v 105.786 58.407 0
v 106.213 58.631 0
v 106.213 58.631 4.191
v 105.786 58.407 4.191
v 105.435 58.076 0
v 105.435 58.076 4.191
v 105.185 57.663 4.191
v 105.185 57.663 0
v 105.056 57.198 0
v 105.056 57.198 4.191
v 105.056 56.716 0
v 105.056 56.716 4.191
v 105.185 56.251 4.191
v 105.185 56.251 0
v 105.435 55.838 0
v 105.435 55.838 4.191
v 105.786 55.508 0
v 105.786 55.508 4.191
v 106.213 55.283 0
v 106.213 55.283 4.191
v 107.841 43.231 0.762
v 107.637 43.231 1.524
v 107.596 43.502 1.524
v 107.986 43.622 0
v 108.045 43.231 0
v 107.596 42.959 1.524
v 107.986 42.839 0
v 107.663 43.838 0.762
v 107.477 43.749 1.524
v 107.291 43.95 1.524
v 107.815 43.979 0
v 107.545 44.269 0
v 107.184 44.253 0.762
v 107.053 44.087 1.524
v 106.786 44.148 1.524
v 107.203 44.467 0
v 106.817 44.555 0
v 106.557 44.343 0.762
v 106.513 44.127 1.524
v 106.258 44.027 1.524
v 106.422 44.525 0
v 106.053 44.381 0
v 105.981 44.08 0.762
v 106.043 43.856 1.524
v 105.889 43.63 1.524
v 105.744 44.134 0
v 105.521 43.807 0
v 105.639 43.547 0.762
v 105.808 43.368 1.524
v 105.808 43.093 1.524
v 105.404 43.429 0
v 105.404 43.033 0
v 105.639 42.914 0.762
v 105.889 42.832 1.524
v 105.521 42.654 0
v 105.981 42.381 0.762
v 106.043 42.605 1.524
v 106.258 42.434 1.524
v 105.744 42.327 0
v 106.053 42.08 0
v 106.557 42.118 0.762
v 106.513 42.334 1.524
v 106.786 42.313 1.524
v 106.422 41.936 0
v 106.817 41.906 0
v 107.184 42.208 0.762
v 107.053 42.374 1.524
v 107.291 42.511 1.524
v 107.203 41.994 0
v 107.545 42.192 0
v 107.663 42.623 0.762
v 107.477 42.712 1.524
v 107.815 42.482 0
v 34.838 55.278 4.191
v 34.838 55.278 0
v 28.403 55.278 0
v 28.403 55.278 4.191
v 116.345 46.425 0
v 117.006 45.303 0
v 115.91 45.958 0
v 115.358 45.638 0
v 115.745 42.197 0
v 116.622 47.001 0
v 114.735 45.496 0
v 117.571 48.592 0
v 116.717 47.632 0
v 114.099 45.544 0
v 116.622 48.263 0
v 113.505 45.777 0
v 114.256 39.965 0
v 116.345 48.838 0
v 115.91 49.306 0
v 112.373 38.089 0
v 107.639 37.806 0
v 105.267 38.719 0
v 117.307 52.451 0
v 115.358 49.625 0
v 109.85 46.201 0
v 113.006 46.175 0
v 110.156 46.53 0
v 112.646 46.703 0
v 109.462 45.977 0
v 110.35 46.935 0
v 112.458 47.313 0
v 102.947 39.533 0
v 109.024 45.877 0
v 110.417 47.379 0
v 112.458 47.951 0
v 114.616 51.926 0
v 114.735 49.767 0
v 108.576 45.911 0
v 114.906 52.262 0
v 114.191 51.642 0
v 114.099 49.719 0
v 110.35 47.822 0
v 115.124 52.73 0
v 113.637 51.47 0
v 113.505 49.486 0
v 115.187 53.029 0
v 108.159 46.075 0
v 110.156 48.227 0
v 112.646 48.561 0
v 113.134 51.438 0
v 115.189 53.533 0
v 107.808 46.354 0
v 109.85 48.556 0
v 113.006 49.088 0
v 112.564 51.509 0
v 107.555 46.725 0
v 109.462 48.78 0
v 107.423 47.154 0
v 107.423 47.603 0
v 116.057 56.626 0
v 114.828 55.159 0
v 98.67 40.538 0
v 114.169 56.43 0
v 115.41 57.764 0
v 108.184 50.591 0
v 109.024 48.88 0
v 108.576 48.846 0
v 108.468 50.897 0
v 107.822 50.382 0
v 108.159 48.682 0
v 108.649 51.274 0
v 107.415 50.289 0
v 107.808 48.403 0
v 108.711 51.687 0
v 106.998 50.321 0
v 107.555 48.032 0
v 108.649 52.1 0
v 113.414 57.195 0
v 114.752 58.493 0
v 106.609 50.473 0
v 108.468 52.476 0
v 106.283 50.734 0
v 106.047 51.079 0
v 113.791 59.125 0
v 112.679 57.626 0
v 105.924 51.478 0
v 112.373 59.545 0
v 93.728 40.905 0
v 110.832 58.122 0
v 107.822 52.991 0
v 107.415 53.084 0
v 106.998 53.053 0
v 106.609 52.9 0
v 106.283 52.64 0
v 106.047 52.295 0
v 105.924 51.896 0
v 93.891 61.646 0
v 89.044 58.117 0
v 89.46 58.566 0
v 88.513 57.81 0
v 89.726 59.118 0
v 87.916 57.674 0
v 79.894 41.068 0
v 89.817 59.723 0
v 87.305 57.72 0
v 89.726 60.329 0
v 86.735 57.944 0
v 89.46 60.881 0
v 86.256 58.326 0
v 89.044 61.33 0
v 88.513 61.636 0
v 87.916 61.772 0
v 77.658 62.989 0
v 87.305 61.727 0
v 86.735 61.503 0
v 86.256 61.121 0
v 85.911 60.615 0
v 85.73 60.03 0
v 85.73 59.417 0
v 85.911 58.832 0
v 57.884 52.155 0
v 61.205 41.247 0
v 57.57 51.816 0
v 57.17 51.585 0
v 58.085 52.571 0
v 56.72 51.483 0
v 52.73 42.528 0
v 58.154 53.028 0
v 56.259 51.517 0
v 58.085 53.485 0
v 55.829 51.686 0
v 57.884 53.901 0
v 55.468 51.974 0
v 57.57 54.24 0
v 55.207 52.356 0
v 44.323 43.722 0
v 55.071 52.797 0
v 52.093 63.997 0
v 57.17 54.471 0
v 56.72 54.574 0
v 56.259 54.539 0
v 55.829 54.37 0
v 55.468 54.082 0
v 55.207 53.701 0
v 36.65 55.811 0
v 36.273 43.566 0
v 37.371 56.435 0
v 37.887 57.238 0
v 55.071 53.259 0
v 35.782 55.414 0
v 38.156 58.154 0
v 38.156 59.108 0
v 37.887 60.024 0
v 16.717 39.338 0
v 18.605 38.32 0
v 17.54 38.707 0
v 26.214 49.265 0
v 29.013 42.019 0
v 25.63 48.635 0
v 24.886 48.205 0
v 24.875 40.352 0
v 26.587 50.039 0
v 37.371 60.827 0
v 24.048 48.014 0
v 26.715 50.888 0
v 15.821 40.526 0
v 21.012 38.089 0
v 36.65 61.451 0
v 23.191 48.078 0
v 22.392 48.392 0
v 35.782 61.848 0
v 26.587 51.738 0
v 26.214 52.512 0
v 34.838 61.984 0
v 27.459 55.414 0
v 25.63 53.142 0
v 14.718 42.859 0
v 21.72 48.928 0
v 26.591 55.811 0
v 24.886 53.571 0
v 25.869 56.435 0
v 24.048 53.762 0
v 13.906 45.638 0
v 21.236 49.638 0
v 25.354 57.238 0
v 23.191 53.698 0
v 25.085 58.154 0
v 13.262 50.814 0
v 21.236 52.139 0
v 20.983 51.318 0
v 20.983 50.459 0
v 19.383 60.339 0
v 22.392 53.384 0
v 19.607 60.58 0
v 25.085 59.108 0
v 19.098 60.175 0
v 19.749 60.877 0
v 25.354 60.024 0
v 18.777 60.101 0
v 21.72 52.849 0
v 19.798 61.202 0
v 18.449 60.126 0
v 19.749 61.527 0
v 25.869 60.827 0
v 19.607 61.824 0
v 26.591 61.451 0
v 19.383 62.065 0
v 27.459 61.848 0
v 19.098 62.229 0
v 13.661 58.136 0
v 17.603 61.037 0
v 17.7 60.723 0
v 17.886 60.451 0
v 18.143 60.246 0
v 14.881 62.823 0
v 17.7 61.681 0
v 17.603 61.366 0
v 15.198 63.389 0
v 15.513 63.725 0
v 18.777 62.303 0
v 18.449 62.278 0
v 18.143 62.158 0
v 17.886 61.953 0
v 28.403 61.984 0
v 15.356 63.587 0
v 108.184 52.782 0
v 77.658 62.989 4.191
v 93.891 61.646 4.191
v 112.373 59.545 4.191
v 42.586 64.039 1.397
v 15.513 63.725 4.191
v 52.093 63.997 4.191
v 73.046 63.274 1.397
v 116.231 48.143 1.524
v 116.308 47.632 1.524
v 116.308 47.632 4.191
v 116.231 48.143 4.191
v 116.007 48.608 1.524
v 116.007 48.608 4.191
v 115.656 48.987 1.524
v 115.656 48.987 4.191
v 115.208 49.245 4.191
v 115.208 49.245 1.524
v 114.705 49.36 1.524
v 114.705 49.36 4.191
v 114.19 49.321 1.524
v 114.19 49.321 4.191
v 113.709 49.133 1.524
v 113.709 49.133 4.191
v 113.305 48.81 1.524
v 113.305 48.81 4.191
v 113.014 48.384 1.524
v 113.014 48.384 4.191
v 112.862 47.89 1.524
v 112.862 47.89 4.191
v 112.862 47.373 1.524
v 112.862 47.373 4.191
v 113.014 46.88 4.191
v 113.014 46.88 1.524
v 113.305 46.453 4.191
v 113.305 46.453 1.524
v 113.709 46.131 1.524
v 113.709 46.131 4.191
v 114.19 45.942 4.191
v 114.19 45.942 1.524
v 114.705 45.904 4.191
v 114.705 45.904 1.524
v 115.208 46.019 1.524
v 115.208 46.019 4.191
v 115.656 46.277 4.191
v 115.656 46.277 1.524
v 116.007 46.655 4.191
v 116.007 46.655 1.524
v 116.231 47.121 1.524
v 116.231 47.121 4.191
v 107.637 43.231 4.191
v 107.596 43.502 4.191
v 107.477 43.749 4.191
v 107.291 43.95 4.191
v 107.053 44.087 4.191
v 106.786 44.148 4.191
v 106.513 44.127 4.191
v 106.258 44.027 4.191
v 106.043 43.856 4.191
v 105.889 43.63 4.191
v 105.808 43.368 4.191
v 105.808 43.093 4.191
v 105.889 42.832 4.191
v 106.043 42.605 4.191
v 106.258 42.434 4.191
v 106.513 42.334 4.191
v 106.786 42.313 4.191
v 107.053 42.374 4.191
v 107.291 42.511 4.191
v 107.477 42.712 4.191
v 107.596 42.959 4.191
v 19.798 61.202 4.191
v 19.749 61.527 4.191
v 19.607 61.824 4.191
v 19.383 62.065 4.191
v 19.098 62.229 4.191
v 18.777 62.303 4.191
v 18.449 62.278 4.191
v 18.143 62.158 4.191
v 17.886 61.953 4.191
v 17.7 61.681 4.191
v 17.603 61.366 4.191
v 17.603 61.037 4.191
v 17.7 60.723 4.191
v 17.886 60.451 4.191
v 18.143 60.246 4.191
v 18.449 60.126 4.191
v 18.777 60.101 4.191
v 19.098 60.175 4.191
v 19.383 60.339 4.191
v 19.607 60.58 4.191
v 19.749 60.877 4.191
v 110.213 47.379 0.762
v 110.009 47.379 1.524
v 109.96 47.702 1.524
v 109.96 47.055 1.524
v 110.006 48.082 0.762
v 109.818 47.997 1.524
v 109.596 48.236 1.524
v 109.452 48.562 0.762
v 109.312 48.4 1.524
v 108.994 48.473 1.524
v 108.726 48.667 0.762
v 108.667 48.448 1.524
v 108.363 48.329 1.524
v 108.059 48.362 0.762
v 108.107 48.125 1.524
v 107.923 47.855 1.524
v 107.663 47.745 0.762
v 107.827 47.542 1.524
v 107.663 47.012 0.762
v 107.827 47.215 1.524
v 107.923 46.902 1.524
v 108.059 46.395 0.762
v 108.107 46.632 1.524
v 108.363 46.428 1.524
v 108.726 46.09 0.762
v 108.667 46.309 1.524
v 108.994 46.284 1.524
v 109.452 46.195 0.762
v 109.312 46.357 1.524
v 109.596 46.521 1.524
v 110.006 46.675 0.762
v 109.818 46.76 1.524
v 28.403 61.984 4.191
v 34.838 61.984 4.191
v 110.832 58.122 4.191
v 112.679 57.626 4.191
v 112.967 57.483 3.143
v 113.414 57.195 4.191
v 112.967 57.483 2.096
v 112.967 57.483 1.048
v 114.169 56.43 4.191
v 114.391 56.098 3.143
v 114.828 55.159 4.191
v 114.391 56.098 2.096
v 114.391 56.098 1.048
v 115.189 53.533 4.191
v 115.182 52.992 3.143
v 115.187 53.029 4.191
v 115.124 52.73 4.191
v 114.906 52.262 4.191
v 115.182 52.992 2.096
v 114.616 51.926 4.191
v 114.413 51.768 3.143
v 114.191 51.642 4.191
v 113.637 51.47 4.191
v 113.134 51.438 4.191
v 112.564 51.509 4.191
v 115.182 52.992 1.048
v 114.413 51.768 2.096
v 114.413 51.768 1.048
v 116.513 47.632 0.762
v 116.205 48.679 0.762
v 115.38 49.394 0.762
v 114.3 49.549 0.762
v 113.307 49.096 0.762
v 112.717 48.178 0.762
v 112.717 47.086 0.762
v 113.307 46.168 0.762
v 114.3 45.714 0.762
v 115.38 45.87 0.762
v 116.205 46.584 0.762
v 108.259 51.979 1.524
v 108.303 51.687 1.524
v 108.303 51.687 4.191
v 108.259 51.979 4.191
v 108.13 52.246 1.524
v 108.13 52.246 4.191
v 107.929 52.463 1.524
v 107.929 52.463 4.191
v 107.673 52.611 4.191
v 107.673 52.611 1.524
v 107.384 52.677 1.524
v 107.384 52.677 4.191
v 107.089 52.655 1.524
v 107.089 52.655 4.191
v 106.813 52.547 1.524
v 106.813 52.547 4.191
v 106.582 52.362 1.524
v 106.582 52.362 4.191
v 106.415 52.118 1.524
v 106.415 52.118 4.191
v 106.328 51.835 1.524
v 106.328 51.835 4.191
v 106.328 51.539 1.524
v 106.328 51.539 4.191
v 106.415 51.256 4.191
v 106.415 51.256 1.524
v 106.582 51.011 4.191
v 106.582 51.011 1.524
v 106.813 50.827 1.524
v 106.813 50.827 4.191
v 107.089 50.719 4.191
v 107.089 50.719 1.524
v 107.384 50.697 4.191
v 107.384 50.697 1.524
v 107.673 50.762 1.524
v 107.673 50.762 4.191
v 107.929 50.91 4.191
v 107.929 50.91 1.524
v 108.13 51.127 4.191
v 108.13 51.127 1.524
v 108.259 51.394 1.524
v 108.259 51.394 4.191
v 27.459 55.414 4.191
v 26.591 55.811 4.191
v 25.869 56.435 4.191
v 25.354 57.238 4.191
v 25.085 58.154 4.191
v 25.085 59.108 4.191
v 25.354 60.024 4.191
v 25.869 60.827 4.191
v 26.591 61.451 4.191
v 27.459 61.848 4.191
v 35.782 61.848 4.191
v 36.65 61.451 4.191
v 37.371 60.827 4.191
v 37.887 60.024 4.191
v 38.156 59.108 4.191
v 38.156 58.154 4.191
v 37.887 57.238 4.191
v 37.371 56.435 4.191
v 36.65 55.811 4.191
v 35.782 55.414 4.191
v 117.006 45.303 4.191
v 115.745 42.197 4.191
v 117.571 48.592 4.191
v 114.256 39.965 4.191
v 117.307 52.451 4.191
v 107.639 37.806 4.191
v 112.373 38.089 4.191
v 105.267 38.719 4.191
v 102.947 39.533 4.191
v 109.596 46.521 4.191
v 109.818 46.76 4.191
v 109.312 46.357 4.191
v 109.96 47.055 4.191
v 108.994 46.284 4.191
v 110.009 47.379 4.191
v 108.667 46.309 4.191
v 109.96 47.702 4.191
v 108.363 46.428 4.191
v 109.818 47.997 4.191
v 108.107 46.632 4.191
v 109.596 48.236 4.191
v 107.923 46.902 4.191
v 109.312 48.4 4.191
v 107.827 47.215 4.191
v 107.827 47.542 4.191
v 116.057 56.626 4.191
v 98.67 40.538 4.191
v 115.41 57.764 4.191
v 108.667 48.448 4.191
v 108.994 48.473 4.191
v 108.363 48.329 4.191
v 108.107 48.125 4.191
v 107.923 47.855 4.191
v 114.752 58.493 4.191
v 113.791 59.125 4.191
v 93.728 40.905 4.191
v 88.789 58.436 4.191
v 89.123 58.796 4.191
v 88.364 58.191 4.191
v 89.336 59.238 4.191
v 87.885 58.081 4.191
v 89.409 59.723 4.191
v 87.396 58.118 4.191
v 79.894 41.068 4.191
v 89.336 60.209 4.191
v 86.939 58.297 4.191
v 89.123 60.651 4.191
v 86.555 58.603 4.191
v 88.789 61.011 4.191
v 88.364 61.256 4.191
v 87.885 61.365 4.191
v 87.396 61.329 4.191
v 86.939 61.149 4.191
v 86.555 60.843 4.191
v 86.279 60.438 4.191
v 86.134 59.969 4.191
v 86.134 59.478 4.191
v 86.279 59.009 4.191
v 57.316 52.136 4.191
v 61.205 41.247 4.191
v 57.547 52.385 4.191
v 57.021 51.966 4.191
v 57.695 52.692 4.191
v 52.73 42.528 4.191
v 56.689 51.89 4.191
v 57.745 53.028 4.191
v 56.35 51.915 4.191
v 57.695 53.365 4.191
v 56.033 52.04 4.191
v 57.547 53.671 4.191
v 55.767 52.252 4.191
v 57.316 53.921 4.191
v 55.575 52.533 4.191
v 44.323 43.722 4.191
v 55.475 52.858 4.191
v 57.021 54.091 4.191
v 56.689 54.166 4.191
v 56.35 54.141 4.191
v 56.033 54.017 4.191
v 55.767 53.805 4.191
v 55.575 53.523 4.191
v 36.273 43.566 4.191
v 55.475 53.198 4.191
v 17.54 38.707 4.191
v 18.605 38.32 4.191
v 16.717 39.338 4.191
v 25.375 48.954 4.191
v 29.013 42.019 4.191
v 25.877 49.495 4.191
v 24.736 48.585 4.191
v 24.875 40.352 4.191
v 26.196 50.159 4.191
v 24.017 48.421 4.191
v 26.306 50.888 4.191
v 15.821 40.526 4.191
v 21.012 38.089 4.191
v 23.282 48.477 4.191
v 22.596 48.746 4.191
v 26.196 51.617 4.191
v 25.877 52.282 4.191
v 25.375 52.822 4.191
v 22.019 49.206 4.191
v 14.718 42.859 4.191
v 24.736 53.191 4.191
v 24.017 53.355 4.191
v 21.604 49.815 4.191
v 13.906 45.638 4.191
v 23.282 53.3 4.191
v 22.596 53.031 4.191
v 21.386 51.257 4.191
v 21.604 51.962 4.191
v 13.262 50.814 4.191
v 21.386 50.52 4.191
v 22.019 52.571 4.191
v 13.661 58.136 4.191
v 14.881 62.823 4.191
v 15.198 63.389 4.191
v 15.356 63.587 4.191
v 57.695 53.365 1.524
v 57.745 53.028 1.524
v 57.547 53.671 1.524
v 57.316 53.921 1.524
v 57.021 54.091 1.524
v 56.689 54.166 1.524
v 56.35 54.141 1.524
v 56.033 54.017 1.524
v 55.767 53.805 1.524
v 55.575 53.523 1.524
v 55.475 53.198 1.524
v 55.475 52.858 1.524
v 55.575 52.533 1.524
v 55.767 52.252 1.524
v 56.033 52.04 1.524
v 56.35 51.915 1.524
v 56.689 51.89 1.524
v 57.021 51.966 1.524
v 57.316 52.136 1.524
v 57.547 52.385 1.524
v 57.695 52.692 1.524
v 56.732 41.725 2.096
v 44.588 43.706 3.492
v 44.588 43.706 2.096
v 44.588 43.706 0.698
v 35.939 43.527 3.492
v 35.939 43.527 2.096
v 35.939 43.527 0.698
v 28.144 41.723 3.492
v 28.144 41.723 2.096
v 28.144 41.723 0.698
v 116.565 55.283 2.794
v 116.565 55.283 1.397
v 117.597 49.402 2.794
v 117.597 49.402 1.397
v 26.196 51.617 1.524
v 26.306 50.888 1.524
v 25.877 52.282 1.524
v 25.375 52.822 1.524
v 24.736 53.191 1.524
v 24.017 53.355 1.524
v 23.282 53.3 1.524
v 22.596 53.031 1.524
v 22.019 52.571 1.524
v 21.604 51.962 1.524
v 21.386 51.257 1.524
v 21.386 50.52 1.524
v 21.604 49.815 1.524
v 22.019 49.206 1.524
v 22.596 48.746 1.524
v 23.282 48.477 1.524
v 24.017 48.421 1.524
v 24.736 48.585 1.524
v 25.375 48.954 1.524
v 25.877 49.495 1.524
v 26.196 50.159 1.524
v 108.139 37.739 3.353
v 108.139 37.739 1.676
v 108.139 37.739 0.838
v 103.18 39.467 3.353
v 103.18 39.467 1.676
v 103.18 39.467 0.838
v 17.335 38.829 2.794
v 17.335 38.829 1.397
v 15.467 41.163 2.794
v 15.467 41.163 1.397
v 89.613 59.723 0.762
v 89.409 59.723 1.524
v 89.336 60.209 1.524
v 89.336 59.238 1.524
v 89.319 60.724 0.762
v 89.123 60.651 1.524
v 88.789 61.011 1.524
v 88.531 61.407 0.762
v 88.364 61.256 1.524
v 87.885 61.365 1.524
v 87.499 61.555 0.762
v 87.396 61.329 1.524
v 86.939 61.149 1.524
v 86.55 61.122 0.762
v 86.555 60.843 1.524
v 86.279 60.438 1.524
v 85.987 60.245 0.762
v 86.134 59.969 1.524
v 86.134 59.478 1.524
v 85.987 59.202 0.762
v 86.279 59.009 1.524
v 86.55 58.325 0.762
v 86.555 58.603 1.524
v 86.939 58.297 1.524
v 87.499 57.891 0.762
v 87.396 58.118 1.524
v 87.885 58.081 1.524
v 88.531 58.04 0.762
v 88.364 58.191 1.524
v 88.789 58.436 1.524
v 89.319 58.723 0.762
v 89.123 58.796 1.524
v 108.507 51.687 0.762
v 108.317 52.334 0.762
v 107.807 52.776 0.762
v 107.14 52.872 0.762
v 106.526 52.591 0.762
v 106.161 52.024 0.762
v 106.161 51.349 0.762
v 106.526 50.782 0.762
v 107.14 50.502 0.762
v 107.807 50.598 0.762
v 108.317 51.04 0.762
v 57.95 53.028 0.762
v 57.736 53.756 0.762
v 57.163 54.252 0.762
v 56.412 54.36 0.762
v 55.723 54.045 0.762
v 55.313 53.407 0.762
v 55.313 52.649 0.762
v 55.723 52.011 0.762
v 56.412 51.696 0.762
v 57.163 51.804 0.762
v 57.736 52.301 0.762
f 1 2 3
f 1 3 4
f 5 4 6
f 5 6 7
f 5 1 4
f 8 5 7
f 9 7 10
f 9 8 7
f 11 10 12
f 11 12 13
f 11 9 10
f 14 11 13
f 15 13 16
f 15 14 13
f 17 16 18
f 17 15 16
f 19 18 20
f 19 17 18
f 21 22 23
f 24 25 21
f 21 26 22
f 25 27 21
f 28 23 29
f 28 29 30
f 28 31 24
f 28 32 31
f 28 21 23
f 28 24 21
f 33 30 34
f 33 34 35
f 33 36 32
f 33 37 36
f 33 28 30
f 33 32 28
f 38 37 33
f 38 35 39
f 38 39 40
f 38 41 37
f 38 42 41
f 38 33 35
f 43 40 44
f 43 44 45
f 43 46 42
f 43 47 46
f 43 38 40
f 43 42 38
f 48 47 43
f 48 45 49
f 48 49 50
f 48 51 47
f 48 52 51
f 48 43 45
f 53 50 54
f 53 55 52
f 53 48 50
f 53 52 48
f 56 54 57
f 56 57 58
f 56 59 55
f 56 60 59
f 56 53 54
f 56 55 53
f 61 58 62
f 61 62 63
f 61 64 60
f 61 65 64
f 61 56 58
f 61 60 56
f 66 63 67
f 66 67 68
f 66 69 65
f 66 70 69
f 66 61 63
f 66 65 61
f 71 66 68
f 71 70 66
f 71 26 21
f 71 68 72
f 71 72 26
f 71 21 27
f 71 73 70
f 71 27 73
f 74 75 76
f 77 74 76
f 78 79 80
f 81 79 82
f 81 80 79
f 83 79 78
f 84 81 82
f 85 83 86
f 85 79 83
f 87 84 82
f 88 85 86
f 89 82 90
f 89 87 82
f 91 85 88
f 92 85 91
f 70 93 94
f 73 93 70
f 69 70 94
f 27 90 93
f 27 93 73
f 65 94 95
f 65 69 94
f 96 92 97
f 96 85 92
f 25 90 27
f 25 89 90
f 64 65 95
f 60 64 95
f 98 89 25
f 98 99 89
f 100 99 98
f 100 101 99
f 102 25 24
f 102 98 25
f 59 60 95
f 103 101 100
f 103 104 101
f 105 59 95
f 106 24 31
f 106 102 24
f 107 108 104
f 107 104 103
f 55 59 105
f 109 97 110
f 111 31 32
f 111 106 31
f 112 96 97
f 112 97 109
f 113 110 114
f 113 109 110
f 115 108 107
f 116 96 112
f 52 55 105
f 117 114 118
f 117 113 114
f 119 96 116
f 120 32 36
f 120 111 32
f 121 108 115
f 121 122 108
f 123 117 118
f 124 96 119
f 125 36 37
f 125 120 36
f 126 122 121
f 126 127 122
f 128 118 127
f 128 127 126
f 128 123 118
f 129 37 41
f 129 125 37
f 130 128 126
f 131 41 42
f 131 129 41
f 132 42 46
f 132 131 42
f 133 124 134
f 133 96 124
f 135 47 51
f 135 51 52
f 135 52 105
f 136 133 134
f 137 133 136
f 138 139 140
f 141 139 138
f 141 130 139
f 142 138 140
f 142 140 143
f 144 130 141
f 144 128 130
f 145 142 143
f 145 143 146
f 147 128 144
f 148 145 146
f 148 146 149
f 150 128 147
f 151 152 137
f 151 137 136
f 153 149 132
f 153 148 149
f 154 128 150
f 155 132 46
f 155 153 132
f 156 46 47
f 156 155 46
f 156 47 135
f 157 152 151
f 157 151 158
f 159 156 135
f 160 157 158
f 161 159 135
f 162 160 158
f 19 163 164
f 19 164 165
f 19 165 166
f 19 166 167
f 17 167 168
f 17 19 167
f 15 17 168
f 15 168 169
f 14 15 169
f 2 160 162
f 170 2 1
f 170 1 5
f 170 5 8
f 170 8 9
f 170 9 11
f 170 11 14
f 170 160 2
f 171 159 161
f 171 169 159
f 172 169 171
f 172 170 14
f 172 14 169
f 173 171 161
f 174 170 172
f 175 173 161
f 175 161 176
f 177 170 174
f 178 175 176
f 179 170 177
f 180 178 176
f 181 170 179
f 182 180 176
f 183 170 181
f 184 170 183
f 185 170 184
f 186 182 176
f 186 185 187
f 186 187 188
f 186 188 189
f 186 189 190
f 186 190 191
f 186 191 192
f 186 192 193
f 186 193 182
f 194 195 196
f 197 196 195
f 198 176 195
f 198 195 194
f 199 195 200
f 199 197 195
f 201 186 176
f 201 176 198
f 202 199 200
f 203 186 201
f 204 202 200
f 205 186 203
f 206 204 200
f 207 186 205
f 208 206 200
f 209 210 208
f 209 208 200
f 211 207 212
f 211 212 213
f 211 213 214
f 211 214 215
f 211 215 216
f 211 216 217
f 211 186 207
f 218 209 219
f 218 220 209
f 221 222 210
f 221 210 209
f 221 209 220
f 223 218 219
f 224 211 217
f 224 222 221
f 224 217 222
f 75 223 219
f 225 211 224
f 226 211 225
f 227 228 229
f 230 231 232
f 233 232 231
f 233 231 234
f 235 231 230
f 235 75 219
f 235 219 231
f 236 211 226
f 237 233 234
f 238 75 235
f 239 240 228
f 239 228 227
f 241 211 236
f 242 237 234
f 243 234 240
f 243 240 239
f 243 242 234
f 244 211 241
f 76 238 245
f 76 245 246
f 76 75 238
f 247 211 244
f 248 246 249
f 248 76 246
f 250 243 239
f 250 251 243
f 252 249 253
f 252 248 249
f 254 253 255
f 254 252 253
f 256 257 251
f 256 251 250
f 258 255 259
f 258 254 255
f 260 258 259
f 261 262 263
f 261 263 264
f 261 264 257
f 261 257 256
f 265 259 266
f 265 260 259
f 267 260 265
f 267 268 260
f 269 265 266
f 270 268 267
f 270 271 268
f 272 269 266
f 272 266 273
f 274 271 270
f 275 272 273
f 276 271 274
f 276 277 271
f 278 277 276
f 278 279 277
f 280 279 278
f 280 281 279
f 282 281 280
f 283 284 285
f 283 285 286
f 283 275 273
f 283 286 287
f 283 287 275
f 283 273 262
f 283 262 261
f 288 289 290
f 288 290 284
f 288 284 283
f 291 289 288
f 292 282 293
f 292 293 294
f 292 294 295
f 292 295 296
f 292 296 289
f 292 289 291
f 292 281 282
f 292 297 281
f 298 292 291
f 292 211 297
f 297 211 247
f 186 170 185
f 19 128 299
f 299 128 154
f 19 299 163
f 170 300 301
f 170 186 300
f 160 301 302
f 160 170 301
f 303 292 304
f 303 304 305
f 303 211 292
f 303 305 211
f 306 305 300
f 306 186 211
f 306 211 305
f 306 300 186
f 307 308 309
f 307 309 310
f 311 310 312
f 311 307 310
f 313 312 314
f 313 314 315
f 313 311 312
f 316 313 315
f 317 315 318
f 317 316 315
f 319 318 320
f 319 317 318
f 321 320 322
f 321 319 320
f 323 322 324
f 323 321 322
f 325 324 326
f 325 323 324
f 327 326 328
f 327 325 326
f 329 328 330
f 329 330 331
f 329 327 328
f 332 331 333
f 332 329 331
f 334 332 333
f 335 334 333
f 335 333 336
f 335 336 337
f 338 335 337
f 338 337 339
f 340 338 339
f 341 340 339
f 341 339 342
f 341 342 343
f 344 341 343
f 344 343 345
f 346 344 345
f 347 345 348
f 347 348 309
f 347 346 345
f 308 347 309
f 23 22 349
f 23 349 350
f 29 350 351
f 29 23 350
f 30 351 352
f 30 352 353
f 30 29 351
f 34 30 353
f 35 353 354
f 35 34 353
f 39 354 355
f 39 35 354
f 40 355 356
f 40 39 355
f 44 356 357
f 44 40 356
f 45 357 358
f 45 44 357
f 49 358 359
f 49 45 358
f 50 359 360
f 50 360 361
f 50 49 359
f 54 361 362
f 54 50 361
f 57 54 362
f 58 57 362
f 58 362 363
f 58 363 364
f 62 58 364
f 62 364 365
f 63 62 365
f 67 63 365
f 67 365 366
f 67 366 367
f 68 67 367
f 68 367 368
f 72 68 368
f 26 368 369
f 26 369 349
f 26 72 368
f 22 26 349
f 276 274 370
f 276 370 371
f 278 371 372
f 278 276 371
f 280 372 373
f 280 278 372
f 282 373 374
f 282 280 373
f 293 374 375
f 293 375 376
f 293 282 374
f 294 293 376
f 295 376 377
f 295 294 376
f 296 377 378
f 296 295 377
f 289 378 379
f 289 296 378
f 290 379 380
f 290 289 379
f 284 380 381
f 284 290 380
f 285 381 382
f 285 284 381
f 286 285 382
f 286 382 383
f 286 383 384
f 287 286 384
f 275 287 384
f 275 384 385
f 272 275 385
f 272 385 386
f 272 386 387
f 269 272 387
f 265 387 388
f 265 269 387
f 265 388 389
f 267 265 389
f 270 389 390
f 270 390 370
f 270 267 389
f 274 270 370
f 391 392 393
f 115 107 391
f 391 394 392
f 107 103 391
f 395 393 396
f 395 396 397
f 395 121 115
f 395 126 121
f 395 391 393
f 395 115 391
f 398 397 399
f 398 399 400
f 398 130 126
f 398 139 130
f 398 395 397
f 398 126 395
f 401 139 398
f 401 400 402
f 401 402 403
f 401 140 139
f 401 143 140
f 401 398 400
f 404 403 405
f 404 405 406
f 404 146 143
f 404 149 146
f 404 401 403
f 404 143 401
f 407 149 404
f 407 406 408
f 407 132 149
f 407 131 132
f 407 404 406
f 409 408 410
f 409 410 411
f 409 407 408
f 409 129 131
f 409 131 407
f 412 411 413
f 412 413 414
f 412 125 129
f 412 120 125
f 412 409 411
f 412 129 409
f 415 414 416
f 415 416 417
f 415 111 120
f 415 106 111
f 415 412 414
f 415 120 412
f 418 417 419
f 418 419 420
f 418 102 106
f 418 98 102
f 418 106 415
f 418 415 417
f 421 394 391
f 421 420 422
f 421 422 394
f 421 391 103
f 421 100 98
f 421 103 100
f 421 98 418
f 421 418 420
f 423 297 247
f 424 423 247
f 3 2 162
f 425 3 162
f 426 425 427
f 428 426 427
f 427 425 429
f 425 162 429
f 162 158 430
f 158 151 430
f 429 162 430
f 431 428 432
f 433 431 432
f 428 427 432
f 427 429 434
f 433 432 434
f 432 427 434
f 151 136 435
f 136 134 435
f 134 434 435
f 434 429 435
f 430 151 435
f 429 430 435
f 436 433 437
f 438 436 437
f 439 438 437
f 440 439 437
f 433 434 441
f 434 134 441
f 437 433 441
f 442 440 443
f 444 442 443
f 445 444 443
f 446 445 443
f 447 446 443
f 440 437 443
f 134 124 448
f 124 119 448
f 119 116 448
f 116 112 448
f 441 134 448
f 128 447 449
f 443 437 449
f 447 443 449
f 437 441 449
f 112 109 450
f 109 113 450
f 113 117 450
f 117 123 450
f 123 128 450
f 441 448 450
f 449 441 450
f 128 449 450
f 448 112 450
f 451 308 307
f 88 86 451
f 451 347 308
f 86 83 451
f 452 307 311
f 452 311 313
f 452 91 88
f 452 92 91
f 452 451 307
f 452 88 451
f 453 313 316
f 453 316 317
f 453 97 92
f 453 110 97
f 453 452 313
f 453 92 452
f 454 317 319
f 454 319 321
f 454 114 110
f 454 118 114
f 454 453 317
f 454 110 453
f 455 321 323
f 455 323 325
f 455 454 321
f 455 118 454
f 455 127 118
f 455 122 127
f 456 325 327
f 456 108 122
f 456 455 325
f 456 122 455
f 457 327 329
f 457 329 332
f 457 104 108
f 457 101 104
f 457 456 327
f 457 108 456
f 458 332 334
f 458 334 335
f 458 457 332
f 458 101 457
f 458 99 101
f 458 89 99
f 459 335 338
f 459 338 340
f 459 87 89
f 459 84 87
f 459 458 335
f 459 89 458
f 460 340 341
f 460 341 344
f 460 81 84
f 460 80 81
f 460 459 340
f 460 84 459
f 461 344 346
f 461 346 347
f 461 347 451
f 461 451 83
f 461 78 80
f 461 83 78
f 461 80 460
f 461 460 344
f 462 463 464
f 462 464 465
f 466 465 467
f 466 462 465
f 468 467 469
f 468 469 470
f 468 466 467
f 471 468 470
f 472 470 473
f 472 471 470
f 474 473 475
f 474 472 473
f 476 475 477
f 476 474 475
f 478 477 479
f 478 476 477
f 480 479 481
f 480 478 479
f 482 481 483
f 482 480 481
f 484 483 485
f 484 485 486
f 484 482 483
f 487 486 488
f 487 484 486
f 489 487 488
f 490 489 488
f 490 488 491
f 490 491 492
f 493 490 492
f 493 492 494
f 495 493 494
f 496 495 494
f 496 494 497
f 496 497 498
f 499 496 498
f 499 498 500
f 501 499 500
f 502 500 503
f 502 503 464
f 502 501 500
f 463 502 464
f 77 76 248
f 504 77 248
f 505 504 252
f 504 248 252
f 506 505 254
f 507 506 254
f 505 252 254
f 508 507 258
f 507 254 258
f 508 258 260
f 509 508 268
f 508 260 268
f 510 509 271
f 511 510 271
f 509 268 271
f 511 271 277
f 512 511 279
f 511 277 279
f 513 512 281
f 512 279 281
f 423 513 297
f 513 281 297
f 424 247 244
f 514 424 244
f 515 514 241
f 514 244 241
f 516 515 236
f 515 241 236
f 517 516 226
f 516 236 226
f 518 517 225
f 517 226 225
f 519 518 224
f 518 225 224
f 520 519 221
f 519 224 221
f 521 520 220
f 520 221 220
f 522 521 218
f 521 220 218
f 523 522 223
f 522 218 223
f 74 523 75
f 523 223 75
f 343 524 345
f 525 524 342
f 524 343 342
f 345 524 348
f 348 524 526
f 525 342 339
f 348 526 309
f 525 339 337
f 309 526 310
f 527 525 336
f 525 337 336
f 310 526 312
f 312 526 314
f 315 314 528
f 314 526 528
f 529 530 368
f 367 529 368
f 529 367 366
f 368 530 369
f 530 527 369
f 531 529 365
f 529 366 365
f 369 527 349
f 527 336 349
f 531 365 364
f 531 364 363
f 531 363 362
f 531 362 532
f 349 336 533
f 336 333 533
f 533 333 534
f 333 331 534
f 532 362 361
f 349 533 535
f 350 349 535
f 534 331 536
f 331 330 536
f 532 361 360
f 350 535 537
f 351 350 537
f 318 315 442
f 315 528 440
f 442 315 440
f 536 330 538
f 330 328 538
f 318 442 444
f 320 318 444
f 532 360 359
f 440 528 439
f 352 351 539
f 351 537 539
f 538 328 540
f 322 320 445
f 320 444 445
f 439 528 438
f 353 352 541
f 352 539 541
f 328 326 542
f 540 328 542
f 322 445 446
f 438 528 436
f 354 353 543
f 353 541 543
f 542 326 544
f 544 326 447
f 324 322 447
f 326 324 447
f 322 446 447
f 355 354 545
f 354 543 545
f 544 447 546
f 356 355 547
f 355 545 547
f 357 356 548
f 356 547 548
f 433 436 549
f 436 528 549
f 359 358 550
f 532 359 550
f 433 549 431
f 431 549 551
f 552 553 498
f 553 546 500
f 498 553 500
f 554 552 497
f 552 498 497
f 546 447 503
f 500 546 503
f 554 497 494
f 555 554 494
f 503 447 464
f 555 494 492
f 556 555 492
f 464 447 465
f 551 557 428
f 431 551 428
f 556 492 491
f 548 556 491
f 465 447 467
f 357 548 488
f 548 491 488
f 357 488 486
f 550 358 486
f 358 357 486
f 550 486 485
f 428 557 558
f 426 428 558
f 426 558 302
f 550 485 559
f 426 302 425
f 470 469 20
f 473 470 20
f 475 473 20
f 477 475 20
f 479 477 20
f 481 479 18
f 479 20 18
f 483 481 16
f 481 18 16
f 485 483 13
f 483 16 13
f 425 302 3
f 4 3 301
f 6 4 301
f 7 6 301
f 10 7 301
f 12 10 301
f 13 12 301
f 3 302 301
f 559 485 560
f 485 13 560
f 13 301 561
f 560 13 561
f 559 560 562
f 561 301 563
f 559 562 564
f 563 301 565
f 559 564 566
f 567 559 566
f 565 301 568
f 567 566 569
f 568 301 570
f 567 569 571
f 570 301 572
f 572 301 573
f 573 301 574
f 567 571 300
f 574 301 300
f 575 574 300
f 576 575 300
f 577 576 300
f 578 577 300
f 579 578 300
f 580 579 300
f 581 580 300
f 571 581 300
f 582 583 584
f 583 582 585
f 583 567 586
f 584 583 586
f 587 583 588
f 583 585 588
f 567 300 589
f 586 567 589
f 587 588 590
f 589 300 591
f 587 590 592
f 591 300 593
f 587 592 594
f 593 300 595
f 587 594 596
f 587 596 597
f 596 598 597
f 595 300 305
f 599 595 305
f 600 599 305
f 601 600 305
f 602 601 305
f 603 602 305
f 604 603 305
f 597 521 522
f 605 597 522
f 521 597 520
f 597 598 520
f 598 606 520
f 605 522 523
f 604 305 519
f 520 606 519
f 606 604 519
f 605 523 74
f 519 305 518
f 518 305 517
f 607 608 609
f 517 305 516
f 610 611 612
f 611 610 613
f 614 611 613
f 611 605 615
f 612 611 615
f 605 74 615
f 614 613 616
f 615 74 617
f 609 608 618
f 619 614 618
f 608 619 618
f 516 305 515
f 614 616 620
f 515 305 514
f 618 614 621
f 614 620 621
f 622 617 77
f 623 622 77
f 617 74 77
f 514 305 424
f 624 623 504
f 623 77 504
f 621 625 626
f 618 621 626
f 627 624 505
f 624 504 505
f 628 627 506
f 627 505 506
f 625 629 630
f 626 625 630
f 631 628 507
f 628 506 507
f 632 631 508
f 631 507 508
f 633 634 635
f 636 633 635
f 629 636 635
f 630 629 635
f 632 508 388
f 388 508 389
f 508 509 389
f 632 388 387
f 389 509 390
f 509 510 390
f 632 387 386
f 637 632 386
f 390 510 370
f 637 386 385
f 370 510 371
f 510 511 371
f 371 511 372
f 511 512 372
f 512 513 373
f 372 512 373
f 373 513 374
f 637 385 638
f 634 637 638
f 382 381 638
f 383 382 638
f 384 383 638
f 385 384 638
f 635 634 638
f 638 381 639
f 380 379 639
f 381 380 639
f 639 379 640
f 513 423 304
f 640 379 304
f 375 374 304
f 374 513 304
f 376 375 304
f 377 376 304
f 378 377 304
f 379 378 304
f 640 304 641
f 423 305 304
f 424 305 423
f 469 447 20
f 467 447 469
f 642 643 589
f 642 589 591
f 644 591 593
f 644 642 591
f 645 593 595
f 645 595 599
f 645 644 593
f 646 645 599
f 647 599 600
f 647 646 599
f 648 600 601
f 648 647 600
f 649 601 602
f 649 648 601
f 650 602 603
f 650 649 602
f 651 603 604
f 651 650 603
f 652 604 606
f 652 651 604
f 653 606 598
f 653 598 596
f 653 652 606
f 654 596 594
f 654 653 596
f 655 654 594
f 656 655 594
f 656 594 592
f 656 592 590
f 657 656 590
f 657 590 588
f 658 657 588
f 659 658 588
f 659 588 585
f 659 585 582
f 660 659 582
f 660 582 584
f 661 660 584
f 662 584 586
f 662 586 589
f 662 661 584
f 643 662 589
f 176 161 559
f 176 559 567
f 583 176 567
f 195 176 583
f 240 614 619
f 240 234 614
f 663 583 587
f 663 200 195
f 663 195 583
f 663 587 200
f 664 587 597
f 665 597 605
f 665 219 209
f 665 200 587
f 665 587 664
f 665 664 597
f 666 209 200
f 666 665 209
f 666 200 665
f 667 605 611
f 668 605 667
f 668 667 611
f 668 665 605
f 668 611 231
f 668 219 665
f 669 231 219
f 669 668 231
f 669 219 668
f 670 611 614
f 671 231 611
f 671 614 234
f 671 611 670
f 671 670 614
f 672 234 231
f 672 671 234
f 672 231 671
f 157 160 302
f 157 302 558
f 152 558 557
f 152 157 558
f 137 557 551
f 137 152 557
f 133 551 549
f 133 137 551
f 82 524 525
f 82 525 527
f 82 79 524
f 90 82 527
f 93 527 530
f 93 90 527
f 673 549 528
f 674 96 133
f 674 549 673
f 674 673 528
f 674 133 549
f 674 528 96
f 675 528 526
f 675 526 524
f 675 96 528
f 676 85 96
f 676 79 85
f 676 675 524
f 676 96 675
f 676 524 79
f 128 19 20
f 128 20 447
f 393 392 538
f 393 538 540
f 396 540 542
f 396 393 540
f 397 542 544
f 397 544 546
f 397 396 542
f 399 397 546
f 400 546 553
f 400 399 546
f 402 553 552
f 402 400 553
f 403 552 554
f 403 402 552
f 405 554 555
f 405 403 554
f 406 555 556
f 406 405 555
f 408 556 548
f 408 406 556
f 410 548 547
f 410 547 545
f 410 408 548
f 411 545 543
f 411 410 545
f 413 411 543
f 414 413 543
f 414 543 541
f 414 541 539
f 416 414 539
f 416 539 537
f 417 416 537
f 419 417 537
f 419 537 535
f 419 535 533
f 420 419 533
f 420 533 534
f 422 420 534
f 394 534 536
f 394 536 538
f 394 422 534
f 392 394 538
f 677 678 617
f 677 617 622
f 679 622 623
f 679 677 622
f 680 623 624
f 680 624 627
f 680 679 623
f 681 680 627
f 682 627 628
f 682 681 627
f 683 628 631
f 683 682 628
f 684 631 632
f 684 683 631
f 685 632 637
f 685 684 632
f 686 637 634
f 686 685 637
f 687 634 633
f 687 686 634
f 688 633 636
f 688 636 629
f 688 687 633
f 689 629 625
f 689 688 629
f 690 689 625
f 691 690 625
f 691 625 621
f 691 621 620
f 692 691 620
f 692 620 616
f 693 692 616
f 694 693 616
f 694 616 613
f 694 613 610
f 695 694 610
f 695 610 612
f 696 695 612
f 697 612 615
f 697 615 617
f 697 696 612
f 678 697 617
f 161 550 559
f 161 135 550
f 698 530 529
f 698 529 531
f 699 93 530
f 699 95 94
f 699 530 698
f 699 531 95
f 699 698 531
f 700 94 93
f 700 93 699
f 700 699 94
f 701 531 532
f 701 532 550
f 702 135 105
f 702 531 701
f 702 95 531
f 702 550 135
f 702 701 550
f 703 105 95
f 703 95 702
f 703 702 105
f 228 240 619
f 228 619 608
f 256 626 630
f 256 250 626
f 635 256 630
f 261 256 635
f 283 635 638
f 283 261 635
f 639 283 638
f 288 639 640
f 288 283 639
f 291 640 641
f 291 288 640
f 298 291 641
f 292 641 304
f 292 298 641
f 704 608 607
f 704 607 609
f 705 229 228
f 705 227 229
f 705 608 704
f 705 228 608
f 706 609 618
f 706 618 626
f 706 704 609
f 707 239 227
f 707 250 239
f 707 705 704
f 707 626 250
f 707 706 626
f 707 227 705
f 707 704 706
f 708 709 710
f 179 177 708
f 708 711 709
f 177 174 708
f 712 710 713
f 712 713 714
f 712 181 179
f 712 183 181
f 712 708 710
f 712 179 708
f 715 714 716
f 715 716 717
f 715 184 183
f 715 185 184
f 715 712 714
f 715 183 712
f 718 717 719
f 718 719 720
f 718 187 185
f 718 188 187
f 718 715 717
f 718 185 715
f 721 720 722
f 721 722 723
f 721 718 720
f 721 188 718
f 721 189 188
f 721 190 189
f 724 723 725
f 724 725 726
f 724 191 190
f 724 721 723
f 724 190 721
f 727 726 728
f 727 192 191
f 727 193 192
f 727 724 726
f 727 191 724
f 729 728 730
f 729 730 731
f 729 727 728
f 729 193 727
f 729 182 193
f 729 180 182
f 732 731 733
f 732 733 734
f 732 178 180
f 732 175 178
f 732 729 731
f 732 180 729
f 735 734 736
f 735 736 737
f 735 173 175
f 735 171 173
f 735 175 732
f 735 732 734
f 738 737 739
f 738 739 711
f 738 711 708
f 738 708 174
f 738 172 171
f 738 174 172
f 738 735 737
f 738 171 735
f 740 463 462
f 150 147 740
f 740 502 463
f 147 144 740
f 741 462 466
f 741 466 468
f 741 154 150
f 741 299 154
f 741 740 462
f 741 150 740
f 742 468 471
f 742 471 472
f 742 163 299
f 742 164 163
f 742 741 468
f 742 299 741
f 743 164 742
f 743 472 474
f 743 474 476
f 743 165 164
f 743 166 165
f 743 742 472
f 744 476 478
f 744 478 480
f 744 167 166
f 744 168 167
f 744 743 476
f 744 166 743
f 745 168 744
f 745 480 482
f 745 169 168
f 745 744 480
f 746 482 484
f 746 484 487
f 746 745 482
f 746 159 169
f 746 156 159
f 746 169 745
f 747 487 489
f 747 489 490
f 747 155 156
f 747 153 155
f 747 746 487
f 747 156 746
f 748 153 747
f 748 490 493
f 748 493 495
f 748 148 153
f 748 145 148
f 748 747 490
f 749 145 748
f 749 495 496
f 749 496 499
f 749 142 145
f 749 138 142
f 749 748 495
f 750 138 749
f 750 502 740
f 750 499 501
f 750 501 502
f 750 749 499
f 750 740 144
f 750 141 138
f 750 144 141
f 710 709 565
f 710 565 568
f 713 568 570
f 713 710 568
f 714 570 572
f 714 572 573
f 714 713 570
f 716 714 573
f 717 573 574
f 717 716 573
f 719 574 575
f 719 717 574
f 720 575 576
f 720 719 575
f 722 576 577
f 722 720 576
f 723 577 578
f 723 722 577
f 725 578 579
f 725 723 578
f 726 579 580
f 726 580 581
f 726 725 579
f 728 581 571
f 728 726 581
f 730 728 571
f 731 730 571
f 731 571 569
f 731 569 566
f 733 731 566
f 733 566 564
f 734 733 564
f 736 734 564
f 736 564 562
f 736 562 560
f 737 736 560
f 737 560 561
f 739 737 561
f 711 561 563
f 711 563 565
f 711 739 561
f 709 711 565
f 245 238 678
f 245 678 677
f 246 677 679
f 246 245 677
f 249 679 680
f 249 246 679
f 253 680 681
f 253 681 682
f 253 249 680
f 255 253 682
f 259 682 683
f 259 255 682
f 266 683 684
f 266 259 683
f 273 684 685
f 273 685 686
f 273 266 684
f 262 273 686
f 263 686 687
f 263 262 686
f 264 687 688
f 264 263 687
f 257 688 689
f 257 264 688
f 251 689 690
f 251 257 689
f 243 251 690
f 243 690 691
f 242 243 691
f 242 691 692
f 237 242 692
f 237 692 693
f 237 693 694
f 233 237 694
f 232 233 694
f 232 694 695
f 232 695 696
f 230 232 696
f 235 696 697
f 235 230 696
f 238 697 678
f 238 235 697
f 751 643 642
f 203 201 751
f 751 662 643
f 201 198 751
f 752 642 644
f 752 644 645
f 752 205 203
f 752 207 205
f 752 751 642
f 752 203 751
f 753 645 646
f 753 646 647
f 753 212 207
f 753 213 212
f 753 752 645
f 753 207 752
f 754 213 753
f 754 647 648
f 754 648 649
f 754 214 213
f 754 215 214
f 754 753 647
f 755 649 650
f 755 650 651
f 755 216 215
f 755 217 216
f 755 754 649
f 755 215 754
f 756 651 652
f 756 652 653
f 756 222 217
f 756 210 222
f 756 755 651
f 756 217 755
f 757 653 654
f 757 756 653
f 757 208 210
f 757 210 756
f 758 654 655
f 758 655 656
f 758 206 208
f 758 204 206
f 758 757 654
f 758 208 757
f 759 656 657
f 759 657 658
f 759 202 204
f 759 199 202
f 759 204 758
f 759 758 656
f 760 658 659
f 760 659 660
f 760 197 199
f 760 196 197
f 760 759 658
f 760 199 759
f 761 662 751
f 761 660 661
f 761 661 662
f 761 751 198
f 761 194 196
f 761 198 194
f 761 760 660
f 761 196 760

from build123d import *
from OCP.BRepFilletAPI import BRepFilletAPI_MakeChamfer

# Parameters (mm, degrees)
SKETCH1_R           = 1.10368272
SKETCH1_R_2         = 2.473771615
SKETCH1_R_3         = 1.141530029
SKETCH1_R_4         = 1.646532991
SKETCH1_R_5         = 0.992957035
SKETCH1_R_6         = 1.097250686
SKETCH1_R_7         = 0.919737921
SKETCH1_R_8         = 1.733023824
BOSS_EXTRUDE1_DEPTH = 4.191
CHAMFER1_SIZE       = 1.524
CHAMFER1_SIZE2      = 0.408354569


with BuildPart() as part:
    # Sketch1 → Boss-Extrude1 (new body)
    with BuildSketch(Plane.XY):
        with BuildLine():
            add(Edge.make_bspline(
                [(15.512876253, 63.725280297), (42.719401206, 63.948789993), (66.786450327, 65.385157199), (112.372925873, 59.54513019)],
                knots=[0, 0, 0, 0, 1, 1, 1, 1], degree=3))
            add(Edge.make_bspline(
                [(112.372925873, 59.54513019), (115.06163518, 59.135245646), (116.794510744, 55.30628864), (118.469687047, 47.231155573), (115.676928934, 40.73972784), (112.372925873, 38.089347261)],
                knots=[0, 0, 0, 0, 0.242320807, 0.484361008, 1, 1, 1, 1], degree=3))
            add(Edge.make_bspline(
                [(112.372925873, 38.089347261), (110.885555874, 37.883707638), (108.600235295, 37.607741566), (106.511043014, 38.028810817), (105.081904878, 38.917056614), (100.621256306, 40.212100692), (97.582606658, 40.947501698), (93.728353676, 40.905124022)],
                knots=[0, 0, 0, 0, 0.125673067, 0.162909154, 0.349088462, 0.435124788, 1, 1, 1, 1], degree=3))
            add(Edge.make_bspline(
                [(93.728353676, 40.905124022), (83.438696491, 41.478986396), (70.837114823, 40.450114199), (56.41922121, 41.6044677), (50.671354177, 43.09350077), (43.718819381, 43.91198411), (33.442775683, 43.82543302), (25.433984632, 41.165000317), (21.011717493, 38.089347261)],
                knots=[0, 0, 0, 0, 0.42688035, 0.50037363, 0.585645125, 0.666780076, 0.783694685, 1, 1, 1, 1], degree=3))
            add(Edge.make_bspline(
                [(21.011717493, 38.089347261), (19.810582443, 38.150303915), (17.367560982, 38.137908515), (11.153943442, 47.277156737), (13.736966959, 62.504701038), (15.512876253, 63.725280297)],
                knots=[0, 0, 0, 0, 0.130512904, 0.225933871, 1, 1, 1, 1], degree=3))
        make_face()
        with Locations((18.694741626, 61.201988498)):
            Circle(SKETCH1_R, mode=Mode.SUBTRACT)
        with Locations((23.83257498, 50.888263766)):
            Circle(SKETCH1_R_2, mode=Mode.SUBTRACT)
        with Locations((56.603802785, 53.028132556)):
            Circle(SKETCH1_R_3, mode=Mode.SUBTRACT)
        with Locations((87.762338524, 59.723272367)):
            Circle(SKETCH1_R_4, mode=Mode.SUBTRACT)
        with Locations((107.309974975, 51.686722441)):
            Circle(SKETCH1_R_5, mode=Mode.SUBTRACT)
        with Locations((108.911518579, 47.378570146)):
            Circle(SKETCH1_R_6, mode=Mode.SUBTRACT)
        with Locations((106.717403841, 43.23057221)):
            Circle(SKETCH1_R_7, mode=Mode.SUBTRACT)
        with Locations((114.575325698, 47.631735726)):
            Circle(SKETCH1_R_8, mode=Mode.SUBTRACT)
        with BuildLine():
            Line((28.403240505, 61.983635523), (34.837697919, 61.983635523))
            ThreePointArc((34.837697919, 61.983635523), (38.190335559, 58.630997882), (34.837697919, 55.278360242))
            Line((34.837697919, 55.278360242), (28.403240505, 55.278360242))
            ThreePointArc((28.403240505, 55.278360242), (25.050602865, 58.630997882), (28.403240505, 61.983635523))
        make_face(mode=Mode.SUBTRACT)
        with BuildLine():
            Line((106.21301999, 55.283465905), (112.563548609, 51.509323308))
            add(Edge.make_bspline(
                [(106.21301999, 58.630997882), (109.208741336, 58.225755094), (113.240394983, 58.369560335), (114.982397754, 55.424174213), (115.335874029, 52.312472158), (114.137714748, 51.176326624), (112.563548609, 51.509323308)],
                knots=[0, 0, 0, 0, 0.426431776, 0.761667371, 0.819024193, 1, 1, 1, 1], degree=3))
            ThreePointArc((106.21301999, 58.630997882), (105.039294672, 56.957231894), (106.21301999, 55.283465905))
        make_face(mode=Mode.SUBTRACT)
    extrude(amount=BOSS_EXTRUDE1_DEPTH)

    # Chamfer1: one chamfer whose edges measure the first distance from different faces: ONE call of the kernel's chamfer builder (chamfer() names one face for all edges)
    chamfer1_edges_1 = [part.edges().sort_by_distance(p)[0] for p in [
        (21.358803365, 50.888263766, 0),
    ]]
    chamfer1_side_1 = [part.faces().sort_by_distance(p)[0] for p in [
        (21.358803365, 50.888263766, 2.0955),
    ]]
    chamfer1_edges_2 = [part.edges().sort_by_distance(p)[0] for p in [
        (55.462272756, 53.028132556, 0),
    ]]
    chamfer1_side_2 = [part.faces().sort_by_distance(p)[0] for p in [
        (55.462272756, 53.028132556, 2.0955),
    ]]
    chamfer1_edges_3 = [part.edges().sort_by_distance(p)[0] for p in [
        (86.115805532, 59.723272367, 0),
    ]]
    chamfer1_side_3 = [part.faces().sort_by_distance(p)[0] for p in [
        (86.115805532, 59.723272367, 2.0955),
    ]]
    chamfer1_edges_4 = [part.edges().sort_by_distance(p)[0] for p in [
        (106.31701794, 51.686722441, 0),
    ]]
    chamfer1_side_4 = [part.faces().sort_by_distance(p)[0] for p in [
        (106.31701794, 51.686722441, 2.0955),
    ]]
    chamfer1_edges_5 = [part.edges().sort_by_distance(p)[0] for p in [
        (107.814267893, 47.378570146, 0),
    ]]
    chamfer1_side_5 = [part.faces().sort_by_distance(p)[0] for p in [
        (107.814267893, 47.378570146, 2.0955),
    ]]
    chamfer1_edges_6 = [part.edges().sort_by_distance(p)[0] for p in [
        (105.79766592, 43.23057221, 0),
    ]]
    chamfer1_side_6 = [part.faces().sort_by_distance(p)[0] for p in [
        (105.79766592, 43.23057221, 2.0955),
    ]]
    chamfer1_edges_7 = [part.edges().sort_by_distance(p)[0] for p in [
        (112.842301875, 47.631735726, 0),
    ]]
    chamfer1_side_7 = [part.faces().sort_by_distance(p)[0] for p in [
        (112.842301875, 47.631735726, 2.0955),
    ]]
    chamfer1 = BRepFilletAPI_MakeChamfer(part.part.solid().wrapped)
    for e in chamfer1_edges_1:
        chamfer1.Add(CHAMFER1_SIZE, CHAMFER1_SIZE2, e.wrapped, chamfer1_side_1[0].wrapped)  # the first distance lies on this face
    for e in chamfer1_edges_2:
        chamfer1.Add(CHAMFER1_SIZE, CHAMFER1_SIZE2, e.wrapped, chamfer1_side_2[0].wrapped)  # the first distance lies on this face
    for e in chamfer1_edges_3:
        chamfer1.Add(CHAMFER1_SIZE, CHAMFER1_SIZE2, e.wrapped, chamfer1_side_3[0].wrapped)  # the first distance lies on this face
    for e in chamfer1_edges_4:
        chamfer1.Add(CHAMFER1_SIZE, CHAMFER1_SIZE2, e.wrapped, chamfer1_side_4[0].wrapped)  # the first distance lies on this face
    for e in chamfer1_edges_5:
        chamfer1.Add(CHAMFER1_SIZE, CHAMFER1_SIZE2, e.wrapped, chamfer1_side_5[0].wrapped)  # the first distance lies on this face
    for e in chamfer1_edges_6:
        chamfer1.Add(CHAMFER1_SIZE, CHAMFER1_SIZE2, e.wrapped, chamfer1_side_6[0].wrapped)  # the first distance lies on this face
    for e in chamfer1_edges_7:
        chamfer1.Add(CHAMFER1_SIZE, CHAMFER1_SIZE2, e.wrapped, chamfer1_side_7[0].wrapped)  # the first distance lies on this face
    add(Compound.cast(chamfer1.Shape()), mode=Mode.REPLACE)


solid = part.part
